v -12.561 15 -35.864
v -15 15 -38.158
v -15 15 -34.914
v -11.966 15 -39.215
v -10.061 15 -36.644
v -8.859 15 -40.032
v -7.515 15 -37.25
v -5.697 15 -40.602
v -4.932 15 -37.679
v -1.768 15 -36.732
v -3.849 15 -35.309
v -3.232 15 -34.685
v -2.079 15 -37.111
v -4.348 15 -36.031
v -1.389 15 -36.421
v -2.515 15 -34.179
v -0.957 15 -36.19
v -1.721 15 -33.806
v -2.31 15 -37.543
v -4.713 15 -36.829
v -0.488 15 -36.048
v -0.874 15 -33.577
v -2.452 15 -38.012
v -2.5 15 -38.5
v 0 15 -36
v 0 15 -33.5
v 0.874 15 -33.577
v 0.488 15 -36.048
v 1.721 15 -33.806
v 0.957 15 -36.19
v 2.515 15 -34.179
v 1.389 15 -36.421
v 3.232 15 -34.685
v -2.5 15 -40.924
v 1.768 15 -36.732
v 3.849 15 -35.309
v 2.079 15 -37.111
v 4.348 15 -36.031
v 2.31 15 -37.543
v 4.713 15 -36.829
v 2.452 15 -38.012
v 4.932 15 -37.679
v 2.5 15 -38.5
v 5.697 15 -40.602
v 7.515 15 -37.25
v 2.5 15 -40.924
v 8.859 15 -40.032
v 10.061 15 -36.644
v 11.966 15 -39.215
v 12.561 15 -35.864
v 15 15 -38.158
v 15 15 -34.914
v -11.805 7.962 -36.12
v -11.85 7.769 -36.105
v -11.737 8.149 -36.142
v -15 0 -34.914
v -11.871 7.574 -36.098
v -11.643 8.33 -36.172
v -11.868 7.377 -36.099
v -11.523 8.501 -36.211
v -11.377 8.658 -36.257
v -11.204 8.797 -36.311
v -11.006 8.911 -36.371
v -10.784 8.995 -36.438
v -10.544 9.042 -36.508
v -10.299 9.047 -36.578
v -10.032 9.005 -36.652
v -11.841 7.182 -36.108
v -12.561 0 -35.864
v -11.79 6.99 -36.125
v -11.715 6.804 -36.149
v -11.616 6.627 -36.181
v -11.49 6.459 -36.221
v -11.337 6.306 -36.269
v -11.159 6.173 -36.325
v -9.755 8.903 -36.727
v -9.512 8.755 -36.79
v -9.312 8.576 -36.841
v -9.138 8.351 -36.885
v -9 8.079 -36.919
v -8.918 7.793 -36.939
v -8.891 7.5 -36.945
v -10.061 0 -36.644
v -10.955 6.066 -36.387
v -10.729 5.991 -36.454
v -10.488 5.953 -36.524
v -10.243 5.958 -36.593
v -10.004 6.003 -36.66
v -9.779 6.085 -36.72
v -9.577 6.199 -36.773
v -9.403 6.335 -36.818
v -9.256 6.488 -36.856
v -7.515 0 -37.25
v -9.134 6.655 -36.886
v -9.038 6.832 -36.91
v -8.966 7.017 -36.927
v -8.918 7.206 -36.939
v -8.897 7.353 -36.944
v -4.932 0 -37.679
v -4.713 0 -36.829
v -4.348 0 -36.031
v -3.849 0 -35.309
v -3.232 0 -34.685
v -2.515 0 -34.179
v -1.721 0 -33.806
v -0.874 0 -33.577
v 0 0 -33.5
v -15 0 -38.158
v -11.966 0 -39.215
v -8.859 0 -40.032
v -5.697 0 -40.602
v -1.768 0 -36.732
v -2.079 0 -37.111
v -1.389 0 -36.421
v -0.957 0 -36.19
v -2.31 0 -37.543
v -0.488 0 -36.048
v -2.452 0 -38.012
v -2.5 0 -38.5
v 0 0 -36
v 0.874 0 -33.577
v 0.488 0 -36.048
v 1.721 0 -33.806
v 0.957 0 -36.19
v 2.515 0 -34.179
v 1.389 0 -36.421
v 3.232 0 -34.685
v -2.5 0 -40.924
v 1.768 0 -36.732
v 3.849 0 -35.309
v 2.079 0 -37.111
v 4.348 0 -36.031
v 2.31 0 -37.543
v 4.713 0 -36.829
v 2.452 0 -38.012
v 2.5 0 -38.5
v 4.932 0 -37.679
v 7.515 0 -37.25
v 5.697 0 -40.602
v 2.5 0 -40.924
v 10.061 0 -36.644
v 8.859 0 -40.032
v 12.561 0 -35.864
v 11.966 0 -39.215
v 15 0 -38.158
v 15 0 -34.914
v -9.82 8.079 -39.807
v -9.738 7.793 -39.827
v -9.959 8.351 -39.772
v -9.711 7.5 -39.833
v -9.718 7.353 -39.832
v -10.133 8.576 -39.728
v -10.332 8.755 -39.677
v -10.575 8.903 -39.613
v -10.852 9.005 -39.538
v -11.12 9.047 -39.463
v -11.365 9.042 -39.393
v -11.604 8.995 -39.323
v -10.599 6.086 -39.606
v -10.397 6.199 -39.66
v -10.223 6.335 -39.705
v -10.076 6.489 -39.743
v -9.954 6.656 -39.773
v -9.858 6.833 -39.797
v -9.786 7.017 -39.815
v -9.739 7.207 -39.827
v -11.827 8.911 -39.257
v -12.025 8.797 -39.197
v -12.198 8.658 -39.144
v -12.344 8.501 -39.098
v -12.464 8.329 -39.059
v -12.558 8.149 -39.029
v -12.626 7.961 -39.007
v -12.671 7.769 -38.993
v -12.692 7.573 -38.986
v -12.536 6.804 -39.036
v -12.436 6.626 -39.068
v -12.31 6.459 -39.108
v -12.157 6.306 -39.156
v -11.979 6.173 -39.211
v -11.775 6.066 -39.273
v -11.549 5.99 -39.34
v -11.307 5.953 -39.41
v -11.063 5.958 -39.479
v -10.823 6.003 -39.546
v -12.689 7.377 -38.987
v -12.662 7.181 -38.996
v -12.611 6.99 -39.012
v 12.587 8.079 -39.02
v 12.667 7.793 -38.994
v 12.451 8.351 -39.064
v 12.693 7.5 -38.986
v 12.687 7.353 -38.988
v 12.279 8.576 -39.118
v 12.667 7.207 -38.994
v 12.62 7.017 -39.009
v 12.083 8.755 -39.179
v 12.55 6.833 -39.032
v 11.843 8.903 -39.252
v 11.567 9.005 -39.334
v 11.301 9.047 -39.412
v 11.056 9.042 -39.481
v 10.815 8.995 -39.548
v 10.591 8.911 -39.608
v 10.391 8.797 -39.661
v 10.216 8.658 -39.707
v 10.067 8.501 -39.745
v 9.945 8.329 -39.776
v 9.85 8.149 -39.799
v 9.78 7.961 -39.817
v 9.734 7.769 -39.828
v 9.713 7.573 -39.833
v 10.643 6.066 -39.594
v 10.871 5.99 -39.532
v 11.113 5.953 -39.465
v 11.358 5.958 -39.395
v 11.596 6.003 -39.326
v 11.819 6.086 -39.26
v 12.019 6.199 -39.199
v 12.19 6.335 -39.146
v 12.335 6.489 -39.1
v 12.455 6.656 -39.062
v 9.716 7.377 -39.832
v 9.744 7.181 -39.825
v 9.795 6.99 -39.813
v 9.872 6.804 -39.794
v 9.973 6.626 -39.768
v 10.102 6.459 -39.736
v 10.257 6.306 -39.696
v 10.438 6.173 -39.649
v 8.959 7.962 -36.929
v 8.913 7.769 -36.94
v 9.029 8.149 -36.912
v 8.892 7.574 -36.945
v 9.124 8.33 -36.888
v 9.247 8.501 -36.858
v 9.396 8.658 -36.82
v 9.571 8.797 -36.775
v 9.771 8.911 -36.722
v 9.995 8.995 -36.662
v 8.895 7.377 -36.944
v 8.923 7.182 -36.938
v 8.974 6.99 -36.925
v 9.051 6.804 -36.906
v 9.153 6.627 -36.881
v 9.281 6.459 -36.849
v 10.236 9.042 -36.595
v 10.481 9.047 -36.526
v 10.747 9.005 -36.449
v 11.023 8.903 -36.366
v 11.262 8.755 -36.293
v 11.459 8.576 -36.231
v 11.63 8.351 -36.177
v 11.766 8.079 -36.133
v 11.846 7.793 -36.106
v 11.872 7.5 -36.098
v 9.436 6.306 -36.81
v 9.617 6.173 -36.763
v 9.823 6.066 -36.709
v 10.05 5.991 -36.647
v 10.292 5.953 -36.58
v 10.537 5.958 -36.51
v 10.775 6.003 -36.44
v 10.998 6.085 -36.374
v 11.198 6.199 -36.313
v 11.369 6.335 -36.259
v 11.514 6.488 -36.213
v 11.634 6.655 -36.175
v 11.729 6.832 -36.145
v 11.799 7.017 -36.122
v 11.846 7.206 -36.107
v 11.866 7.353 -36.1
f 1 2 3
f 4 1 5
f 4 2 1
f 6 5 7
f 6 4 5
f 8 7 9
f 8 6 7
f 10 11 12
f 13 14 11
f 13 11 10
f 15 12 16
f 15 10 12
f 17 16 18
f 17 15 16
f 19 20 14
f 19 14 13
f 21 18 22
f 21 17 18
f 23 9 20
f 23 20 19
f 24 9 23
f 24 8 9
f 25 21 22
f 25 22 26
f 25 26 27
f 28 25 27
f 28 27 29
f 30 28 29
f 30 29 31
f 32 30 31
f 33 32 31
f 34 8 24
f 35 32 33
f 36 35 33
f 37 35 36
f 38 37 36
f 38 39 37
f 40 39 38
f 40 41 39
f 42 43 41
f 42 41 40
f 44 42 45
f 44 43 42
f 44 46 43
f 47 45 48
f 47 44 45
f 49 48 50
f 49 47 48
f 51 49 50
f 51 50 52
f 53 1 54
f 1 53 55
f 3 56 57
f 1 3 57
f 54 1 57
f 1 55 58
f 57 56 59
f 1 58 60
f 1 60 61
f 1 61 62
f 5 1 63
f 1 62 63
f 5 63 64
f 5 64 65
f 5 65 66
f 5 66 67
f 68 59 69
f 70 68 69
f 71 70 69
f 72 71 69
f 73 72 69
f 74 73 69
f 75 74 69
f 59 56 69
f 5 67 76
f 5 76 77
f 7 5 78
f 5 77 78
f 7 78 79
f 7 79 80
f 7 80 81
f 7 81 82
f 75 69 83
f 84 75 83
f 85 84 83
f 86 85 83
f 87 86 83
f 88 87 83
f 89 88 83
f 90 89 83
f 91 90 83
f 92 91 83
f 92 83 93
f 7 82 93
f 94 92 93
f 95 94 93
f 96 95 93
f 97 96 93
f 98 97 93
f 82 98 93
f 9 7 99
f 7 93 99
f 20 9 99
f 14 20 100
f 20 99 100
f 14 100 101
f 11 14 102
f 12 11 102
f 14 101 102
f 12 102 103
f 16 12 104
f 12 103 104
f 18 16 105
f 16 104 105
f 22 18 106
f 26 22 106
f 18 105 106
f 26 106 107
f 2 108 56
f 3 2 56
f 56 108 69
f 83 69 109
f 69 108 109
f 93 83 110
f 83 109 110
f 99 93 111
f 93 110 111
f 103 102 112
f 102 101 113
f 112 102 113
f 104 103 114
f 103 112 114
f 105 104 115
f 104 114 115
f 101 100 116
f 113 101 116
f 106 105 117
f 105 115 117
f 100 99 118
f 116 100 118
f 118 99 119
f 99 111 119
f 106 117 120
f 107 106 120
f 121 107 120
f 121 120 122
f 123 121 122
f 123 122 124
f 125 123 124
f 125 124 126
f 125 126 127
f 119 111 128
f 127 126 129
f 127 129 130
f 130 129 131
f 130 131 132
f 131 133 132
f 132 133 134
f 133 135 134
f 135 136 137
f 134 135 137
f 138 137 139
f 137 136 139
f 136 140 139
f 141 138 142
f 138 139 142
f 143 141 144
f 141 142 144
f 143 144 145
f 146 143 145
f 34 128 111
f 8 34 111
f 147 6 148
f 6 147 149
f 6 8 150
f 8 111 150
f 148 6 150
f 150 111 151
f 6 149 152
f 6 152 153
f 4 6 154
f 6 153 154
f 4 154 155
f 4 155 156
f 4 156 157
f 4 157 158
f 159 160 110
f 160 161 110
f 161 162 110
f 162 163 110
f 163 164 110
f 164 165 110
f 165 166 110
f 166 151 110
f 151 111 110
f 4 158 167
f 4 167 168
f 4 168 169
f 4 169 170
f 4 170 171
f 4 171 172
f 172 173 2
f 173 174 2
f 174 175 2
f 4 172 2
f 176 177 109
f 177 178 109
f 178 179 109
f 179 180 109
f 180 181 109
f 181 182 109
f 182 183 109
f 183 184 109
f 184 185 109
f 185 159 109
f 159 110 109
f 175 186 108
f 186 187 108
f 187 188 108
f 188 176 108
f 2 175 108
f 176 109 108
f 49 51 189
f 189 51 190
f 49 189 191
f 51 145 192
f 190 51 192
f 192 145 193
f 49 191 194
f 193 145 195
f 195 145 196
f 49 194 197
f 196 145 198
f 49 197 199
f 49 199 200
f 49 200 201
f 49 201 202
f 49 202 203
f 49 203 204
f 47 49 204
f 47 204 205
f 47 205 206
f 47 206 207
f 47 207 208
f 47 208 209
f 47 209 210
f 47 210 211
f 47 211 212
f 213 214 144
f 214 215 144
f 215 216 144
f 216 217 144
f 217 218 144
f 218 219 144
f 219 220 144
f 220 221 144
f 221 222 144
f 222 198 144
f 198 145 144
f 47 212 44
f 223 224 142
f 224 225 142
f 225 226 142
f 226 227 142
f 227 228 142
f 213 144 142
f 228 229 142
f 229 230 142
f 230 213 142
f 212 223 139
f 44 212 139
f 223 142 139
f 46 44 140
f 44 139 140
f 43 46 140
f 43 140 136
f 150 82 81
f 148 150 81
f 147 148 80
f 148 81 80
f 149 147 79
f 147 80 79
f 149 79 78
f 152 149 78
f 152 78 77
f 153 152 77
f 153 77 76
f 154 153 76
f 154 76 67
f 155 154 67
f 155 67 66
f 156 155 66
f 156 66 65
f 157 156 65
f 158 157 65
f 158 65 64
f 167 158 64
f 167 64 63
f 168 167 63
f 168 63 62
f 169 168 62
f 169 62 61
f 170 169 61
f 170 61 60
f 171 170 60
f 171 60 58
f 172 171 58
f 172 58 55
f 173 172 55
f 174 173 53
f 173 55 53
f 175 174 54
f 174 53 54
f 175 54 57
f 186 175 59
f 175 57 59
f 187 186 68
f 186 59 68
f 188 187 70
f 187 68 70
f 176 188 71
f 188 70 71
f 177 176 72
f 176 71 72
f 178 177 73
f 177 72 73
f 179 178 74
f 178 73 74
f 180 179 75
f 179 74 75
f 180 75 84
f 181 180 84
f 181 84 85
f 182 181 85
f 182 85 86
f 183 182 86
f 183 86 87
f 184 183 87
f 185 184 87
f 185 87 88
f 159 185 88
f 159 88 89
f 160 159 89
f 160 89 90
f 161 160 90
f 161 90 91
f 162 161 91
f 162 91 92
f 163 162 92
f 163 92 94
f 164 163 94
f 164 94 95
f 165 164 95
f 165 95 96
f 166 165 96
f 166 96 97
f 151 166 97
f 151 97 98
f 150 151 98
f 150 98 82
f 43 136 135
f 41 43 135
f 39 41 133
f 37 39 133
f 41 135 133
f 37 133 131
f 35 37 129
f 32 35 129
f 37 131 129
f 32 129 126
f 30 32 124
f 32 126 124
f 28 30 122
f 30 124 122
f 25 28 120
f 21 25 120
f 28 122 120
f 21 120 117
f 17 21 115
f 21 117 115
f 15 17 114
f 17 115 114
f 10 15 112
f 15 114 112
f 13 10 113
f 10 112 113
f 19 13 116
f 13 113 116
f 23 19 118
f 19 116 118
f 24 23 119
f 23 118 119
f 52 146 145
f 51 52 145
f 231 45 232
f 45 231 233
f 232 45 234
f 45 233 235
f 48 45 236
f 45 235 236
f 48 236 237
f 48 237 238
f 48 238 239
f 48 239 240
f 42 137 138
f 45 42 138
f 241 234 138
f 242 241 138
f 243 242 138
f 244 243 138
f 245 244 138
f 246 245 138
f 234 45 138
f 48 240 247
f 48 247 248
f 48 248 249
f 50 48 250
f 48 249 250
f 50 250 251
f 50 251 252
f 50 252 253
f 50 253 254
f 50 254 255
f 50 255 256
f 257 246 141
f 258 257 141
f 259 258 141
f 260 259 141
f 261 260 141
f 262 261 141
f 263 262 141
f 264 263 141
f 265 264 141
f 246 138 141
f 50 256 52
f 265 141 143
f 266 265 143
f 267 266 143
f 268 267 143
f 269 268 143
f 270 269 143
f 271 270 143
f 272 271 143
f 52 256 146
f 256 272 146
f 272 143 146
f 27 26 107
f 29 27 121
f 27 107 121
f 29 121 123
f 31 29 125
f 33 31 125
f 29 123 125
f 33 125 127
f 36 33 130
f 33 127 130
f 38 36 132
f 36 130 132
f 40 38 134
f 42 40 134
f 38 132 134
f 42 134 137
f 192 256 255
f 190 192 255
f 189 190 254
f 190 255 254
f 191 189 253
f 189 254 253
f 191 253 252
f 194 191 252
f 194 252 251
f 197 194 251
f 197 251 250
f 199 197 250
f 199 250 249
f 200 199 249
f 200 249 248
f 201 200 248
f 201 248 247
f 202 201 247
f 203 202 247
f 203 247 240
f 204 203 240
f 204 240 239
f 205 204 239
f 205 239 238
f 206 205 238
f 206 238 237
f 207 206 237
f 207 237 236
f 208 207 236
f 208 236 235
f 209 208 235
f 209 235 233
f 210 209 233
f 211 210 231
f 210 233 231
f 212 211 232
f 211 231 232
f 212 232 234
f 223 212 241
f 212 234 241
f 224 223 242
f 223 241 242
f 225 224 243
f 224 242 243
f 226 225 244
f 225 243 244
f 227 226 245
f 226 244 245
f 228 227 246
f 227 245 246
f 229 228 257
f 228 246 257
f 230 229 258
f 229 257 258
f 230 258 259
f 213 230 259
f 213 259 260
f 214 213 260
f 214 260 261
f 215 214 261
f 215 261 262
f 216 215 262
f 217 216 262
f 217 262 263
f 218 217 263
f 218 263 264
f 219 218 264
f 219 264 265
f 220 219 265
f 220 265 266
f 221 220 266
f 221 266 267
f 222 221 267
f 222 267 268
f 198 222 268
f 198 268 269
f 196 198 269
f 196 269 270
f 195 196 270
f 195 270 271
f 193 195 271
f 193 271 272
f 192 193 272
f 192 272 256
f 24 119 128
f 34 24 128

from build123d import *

# Parameters (mm, degrees)
BOSS_EXTRU_1_DEPTH             = 15
D_GAGEMENT_M41_D               = 3.1
D_GAGEMENT_M41_DEPTH           = 30
D_GAGEMENT_M41_TIP             = 0.931333959
D_GAGEMENT_M41_ON_FACE_2_D     = 3.1
D_GAGEMENT_M41_ON_FACE_2_DEPTH = 30
D_GAGEMENT_M41_ON_FACE_2_TIP   = 0.931333959


with BuildPart() as part:
    # Esquisse1 → Boss.-Extru.1 (new body)
    with BuildSketch(Plane(origin=(0, 0, 0), x_dir=(1, 0, 0), z_dir=(0, 1, 0))):
        with BuildLine():
            Line((-2.5, 38.5), (-2.5, 40.923709509))
            ThreePointArc((-2.5, 40.923709509), (-8.858633339, 40.031545253), (-15, 38.157568057))
            Line((-15, 38.157568057), (-15, 34.9141805))
            ThreePointArc((-15, 34.9141805), (-10.061424249, 36.64379541), (-4.93206398, 37.678571429))
            ThreePointArc((-4.93206398, 37.678571429), (-3.232093528, 34.685085659), (0, 33.5))
            ThreePointArc((0, 33.5), (3.232093528, 34.685085659), (4.93206398, 37.678571429))
            ThreePointArc((4.93206398, 37.678571429), (10.061424249, 36.64379541), (15, 34.9141805))
            Line((15, 34.9141805), (15, 38.157568057))
            ThreePointArc((15, 38.157568057), (8.858633339, 40.031545253), (2.5, 40.923709509))
            Line((2.5, 40.923709509), (2.5, 38.5))
            ThreePointArc((2.5, 38.5), (0, 36), (-2.5, 38.5))
        make_face()
    extrude(amount=BOSS_EXTRU_1_DEPTH)

    # Dégagement M41
    with Locations(Plane(origin=(-11.210356129, 7.5, -39.437645917), x_dir=(-0.961893803, 0, 0.27342332), z_dir=(-0.27342332, 0, -0.961893803))):
        with Locations((0, 0)):
            Hole(D_GAGEMENT_M41_D / 2, depth=D_GAGEMENT_M41_DEPTH)
            with Locations((0, 0, -(D_GAGEMENT_M41_DEPTH + D_GAGEMENT_M41_TIP / 2))):  # 118° drill point
                Cone(0, D_GAGEMENT_M41_D / 2, D_GAGEMENT_M41_TIP, mode=Mode.SUBTRACT)

    # Dégagement M41 on face 2
    with Locations(Plane(origin=(11.210356129, 7.5, -39.437645917), x_dir=(-0.961893902, 0, -0.273422972), z_dir=(0.273422972, 0, -0.961893902))):
        with Locations((0, 0)):
            Hole(D_GAGEMENT_M41_ON_FACE_2_D / 2, depth=D_GAGEMENT_M41_ON_FACE_2_DEPTH)
            with Locations((0, 0, -(D_GAGEMENT_M41_ON_FACE_2_DEPTH + D_GAGEMENT_M41_ON_FACE_2_TIP / 2))):  # 118° drill point
                Cone(0, D_GAGEMENT_M41_ON_FACE_2_D / 2, D_GAGEMENT_M41_ON_FACE_2_TIP, mode=Mode.SUBTRACT)


solid = part.part
